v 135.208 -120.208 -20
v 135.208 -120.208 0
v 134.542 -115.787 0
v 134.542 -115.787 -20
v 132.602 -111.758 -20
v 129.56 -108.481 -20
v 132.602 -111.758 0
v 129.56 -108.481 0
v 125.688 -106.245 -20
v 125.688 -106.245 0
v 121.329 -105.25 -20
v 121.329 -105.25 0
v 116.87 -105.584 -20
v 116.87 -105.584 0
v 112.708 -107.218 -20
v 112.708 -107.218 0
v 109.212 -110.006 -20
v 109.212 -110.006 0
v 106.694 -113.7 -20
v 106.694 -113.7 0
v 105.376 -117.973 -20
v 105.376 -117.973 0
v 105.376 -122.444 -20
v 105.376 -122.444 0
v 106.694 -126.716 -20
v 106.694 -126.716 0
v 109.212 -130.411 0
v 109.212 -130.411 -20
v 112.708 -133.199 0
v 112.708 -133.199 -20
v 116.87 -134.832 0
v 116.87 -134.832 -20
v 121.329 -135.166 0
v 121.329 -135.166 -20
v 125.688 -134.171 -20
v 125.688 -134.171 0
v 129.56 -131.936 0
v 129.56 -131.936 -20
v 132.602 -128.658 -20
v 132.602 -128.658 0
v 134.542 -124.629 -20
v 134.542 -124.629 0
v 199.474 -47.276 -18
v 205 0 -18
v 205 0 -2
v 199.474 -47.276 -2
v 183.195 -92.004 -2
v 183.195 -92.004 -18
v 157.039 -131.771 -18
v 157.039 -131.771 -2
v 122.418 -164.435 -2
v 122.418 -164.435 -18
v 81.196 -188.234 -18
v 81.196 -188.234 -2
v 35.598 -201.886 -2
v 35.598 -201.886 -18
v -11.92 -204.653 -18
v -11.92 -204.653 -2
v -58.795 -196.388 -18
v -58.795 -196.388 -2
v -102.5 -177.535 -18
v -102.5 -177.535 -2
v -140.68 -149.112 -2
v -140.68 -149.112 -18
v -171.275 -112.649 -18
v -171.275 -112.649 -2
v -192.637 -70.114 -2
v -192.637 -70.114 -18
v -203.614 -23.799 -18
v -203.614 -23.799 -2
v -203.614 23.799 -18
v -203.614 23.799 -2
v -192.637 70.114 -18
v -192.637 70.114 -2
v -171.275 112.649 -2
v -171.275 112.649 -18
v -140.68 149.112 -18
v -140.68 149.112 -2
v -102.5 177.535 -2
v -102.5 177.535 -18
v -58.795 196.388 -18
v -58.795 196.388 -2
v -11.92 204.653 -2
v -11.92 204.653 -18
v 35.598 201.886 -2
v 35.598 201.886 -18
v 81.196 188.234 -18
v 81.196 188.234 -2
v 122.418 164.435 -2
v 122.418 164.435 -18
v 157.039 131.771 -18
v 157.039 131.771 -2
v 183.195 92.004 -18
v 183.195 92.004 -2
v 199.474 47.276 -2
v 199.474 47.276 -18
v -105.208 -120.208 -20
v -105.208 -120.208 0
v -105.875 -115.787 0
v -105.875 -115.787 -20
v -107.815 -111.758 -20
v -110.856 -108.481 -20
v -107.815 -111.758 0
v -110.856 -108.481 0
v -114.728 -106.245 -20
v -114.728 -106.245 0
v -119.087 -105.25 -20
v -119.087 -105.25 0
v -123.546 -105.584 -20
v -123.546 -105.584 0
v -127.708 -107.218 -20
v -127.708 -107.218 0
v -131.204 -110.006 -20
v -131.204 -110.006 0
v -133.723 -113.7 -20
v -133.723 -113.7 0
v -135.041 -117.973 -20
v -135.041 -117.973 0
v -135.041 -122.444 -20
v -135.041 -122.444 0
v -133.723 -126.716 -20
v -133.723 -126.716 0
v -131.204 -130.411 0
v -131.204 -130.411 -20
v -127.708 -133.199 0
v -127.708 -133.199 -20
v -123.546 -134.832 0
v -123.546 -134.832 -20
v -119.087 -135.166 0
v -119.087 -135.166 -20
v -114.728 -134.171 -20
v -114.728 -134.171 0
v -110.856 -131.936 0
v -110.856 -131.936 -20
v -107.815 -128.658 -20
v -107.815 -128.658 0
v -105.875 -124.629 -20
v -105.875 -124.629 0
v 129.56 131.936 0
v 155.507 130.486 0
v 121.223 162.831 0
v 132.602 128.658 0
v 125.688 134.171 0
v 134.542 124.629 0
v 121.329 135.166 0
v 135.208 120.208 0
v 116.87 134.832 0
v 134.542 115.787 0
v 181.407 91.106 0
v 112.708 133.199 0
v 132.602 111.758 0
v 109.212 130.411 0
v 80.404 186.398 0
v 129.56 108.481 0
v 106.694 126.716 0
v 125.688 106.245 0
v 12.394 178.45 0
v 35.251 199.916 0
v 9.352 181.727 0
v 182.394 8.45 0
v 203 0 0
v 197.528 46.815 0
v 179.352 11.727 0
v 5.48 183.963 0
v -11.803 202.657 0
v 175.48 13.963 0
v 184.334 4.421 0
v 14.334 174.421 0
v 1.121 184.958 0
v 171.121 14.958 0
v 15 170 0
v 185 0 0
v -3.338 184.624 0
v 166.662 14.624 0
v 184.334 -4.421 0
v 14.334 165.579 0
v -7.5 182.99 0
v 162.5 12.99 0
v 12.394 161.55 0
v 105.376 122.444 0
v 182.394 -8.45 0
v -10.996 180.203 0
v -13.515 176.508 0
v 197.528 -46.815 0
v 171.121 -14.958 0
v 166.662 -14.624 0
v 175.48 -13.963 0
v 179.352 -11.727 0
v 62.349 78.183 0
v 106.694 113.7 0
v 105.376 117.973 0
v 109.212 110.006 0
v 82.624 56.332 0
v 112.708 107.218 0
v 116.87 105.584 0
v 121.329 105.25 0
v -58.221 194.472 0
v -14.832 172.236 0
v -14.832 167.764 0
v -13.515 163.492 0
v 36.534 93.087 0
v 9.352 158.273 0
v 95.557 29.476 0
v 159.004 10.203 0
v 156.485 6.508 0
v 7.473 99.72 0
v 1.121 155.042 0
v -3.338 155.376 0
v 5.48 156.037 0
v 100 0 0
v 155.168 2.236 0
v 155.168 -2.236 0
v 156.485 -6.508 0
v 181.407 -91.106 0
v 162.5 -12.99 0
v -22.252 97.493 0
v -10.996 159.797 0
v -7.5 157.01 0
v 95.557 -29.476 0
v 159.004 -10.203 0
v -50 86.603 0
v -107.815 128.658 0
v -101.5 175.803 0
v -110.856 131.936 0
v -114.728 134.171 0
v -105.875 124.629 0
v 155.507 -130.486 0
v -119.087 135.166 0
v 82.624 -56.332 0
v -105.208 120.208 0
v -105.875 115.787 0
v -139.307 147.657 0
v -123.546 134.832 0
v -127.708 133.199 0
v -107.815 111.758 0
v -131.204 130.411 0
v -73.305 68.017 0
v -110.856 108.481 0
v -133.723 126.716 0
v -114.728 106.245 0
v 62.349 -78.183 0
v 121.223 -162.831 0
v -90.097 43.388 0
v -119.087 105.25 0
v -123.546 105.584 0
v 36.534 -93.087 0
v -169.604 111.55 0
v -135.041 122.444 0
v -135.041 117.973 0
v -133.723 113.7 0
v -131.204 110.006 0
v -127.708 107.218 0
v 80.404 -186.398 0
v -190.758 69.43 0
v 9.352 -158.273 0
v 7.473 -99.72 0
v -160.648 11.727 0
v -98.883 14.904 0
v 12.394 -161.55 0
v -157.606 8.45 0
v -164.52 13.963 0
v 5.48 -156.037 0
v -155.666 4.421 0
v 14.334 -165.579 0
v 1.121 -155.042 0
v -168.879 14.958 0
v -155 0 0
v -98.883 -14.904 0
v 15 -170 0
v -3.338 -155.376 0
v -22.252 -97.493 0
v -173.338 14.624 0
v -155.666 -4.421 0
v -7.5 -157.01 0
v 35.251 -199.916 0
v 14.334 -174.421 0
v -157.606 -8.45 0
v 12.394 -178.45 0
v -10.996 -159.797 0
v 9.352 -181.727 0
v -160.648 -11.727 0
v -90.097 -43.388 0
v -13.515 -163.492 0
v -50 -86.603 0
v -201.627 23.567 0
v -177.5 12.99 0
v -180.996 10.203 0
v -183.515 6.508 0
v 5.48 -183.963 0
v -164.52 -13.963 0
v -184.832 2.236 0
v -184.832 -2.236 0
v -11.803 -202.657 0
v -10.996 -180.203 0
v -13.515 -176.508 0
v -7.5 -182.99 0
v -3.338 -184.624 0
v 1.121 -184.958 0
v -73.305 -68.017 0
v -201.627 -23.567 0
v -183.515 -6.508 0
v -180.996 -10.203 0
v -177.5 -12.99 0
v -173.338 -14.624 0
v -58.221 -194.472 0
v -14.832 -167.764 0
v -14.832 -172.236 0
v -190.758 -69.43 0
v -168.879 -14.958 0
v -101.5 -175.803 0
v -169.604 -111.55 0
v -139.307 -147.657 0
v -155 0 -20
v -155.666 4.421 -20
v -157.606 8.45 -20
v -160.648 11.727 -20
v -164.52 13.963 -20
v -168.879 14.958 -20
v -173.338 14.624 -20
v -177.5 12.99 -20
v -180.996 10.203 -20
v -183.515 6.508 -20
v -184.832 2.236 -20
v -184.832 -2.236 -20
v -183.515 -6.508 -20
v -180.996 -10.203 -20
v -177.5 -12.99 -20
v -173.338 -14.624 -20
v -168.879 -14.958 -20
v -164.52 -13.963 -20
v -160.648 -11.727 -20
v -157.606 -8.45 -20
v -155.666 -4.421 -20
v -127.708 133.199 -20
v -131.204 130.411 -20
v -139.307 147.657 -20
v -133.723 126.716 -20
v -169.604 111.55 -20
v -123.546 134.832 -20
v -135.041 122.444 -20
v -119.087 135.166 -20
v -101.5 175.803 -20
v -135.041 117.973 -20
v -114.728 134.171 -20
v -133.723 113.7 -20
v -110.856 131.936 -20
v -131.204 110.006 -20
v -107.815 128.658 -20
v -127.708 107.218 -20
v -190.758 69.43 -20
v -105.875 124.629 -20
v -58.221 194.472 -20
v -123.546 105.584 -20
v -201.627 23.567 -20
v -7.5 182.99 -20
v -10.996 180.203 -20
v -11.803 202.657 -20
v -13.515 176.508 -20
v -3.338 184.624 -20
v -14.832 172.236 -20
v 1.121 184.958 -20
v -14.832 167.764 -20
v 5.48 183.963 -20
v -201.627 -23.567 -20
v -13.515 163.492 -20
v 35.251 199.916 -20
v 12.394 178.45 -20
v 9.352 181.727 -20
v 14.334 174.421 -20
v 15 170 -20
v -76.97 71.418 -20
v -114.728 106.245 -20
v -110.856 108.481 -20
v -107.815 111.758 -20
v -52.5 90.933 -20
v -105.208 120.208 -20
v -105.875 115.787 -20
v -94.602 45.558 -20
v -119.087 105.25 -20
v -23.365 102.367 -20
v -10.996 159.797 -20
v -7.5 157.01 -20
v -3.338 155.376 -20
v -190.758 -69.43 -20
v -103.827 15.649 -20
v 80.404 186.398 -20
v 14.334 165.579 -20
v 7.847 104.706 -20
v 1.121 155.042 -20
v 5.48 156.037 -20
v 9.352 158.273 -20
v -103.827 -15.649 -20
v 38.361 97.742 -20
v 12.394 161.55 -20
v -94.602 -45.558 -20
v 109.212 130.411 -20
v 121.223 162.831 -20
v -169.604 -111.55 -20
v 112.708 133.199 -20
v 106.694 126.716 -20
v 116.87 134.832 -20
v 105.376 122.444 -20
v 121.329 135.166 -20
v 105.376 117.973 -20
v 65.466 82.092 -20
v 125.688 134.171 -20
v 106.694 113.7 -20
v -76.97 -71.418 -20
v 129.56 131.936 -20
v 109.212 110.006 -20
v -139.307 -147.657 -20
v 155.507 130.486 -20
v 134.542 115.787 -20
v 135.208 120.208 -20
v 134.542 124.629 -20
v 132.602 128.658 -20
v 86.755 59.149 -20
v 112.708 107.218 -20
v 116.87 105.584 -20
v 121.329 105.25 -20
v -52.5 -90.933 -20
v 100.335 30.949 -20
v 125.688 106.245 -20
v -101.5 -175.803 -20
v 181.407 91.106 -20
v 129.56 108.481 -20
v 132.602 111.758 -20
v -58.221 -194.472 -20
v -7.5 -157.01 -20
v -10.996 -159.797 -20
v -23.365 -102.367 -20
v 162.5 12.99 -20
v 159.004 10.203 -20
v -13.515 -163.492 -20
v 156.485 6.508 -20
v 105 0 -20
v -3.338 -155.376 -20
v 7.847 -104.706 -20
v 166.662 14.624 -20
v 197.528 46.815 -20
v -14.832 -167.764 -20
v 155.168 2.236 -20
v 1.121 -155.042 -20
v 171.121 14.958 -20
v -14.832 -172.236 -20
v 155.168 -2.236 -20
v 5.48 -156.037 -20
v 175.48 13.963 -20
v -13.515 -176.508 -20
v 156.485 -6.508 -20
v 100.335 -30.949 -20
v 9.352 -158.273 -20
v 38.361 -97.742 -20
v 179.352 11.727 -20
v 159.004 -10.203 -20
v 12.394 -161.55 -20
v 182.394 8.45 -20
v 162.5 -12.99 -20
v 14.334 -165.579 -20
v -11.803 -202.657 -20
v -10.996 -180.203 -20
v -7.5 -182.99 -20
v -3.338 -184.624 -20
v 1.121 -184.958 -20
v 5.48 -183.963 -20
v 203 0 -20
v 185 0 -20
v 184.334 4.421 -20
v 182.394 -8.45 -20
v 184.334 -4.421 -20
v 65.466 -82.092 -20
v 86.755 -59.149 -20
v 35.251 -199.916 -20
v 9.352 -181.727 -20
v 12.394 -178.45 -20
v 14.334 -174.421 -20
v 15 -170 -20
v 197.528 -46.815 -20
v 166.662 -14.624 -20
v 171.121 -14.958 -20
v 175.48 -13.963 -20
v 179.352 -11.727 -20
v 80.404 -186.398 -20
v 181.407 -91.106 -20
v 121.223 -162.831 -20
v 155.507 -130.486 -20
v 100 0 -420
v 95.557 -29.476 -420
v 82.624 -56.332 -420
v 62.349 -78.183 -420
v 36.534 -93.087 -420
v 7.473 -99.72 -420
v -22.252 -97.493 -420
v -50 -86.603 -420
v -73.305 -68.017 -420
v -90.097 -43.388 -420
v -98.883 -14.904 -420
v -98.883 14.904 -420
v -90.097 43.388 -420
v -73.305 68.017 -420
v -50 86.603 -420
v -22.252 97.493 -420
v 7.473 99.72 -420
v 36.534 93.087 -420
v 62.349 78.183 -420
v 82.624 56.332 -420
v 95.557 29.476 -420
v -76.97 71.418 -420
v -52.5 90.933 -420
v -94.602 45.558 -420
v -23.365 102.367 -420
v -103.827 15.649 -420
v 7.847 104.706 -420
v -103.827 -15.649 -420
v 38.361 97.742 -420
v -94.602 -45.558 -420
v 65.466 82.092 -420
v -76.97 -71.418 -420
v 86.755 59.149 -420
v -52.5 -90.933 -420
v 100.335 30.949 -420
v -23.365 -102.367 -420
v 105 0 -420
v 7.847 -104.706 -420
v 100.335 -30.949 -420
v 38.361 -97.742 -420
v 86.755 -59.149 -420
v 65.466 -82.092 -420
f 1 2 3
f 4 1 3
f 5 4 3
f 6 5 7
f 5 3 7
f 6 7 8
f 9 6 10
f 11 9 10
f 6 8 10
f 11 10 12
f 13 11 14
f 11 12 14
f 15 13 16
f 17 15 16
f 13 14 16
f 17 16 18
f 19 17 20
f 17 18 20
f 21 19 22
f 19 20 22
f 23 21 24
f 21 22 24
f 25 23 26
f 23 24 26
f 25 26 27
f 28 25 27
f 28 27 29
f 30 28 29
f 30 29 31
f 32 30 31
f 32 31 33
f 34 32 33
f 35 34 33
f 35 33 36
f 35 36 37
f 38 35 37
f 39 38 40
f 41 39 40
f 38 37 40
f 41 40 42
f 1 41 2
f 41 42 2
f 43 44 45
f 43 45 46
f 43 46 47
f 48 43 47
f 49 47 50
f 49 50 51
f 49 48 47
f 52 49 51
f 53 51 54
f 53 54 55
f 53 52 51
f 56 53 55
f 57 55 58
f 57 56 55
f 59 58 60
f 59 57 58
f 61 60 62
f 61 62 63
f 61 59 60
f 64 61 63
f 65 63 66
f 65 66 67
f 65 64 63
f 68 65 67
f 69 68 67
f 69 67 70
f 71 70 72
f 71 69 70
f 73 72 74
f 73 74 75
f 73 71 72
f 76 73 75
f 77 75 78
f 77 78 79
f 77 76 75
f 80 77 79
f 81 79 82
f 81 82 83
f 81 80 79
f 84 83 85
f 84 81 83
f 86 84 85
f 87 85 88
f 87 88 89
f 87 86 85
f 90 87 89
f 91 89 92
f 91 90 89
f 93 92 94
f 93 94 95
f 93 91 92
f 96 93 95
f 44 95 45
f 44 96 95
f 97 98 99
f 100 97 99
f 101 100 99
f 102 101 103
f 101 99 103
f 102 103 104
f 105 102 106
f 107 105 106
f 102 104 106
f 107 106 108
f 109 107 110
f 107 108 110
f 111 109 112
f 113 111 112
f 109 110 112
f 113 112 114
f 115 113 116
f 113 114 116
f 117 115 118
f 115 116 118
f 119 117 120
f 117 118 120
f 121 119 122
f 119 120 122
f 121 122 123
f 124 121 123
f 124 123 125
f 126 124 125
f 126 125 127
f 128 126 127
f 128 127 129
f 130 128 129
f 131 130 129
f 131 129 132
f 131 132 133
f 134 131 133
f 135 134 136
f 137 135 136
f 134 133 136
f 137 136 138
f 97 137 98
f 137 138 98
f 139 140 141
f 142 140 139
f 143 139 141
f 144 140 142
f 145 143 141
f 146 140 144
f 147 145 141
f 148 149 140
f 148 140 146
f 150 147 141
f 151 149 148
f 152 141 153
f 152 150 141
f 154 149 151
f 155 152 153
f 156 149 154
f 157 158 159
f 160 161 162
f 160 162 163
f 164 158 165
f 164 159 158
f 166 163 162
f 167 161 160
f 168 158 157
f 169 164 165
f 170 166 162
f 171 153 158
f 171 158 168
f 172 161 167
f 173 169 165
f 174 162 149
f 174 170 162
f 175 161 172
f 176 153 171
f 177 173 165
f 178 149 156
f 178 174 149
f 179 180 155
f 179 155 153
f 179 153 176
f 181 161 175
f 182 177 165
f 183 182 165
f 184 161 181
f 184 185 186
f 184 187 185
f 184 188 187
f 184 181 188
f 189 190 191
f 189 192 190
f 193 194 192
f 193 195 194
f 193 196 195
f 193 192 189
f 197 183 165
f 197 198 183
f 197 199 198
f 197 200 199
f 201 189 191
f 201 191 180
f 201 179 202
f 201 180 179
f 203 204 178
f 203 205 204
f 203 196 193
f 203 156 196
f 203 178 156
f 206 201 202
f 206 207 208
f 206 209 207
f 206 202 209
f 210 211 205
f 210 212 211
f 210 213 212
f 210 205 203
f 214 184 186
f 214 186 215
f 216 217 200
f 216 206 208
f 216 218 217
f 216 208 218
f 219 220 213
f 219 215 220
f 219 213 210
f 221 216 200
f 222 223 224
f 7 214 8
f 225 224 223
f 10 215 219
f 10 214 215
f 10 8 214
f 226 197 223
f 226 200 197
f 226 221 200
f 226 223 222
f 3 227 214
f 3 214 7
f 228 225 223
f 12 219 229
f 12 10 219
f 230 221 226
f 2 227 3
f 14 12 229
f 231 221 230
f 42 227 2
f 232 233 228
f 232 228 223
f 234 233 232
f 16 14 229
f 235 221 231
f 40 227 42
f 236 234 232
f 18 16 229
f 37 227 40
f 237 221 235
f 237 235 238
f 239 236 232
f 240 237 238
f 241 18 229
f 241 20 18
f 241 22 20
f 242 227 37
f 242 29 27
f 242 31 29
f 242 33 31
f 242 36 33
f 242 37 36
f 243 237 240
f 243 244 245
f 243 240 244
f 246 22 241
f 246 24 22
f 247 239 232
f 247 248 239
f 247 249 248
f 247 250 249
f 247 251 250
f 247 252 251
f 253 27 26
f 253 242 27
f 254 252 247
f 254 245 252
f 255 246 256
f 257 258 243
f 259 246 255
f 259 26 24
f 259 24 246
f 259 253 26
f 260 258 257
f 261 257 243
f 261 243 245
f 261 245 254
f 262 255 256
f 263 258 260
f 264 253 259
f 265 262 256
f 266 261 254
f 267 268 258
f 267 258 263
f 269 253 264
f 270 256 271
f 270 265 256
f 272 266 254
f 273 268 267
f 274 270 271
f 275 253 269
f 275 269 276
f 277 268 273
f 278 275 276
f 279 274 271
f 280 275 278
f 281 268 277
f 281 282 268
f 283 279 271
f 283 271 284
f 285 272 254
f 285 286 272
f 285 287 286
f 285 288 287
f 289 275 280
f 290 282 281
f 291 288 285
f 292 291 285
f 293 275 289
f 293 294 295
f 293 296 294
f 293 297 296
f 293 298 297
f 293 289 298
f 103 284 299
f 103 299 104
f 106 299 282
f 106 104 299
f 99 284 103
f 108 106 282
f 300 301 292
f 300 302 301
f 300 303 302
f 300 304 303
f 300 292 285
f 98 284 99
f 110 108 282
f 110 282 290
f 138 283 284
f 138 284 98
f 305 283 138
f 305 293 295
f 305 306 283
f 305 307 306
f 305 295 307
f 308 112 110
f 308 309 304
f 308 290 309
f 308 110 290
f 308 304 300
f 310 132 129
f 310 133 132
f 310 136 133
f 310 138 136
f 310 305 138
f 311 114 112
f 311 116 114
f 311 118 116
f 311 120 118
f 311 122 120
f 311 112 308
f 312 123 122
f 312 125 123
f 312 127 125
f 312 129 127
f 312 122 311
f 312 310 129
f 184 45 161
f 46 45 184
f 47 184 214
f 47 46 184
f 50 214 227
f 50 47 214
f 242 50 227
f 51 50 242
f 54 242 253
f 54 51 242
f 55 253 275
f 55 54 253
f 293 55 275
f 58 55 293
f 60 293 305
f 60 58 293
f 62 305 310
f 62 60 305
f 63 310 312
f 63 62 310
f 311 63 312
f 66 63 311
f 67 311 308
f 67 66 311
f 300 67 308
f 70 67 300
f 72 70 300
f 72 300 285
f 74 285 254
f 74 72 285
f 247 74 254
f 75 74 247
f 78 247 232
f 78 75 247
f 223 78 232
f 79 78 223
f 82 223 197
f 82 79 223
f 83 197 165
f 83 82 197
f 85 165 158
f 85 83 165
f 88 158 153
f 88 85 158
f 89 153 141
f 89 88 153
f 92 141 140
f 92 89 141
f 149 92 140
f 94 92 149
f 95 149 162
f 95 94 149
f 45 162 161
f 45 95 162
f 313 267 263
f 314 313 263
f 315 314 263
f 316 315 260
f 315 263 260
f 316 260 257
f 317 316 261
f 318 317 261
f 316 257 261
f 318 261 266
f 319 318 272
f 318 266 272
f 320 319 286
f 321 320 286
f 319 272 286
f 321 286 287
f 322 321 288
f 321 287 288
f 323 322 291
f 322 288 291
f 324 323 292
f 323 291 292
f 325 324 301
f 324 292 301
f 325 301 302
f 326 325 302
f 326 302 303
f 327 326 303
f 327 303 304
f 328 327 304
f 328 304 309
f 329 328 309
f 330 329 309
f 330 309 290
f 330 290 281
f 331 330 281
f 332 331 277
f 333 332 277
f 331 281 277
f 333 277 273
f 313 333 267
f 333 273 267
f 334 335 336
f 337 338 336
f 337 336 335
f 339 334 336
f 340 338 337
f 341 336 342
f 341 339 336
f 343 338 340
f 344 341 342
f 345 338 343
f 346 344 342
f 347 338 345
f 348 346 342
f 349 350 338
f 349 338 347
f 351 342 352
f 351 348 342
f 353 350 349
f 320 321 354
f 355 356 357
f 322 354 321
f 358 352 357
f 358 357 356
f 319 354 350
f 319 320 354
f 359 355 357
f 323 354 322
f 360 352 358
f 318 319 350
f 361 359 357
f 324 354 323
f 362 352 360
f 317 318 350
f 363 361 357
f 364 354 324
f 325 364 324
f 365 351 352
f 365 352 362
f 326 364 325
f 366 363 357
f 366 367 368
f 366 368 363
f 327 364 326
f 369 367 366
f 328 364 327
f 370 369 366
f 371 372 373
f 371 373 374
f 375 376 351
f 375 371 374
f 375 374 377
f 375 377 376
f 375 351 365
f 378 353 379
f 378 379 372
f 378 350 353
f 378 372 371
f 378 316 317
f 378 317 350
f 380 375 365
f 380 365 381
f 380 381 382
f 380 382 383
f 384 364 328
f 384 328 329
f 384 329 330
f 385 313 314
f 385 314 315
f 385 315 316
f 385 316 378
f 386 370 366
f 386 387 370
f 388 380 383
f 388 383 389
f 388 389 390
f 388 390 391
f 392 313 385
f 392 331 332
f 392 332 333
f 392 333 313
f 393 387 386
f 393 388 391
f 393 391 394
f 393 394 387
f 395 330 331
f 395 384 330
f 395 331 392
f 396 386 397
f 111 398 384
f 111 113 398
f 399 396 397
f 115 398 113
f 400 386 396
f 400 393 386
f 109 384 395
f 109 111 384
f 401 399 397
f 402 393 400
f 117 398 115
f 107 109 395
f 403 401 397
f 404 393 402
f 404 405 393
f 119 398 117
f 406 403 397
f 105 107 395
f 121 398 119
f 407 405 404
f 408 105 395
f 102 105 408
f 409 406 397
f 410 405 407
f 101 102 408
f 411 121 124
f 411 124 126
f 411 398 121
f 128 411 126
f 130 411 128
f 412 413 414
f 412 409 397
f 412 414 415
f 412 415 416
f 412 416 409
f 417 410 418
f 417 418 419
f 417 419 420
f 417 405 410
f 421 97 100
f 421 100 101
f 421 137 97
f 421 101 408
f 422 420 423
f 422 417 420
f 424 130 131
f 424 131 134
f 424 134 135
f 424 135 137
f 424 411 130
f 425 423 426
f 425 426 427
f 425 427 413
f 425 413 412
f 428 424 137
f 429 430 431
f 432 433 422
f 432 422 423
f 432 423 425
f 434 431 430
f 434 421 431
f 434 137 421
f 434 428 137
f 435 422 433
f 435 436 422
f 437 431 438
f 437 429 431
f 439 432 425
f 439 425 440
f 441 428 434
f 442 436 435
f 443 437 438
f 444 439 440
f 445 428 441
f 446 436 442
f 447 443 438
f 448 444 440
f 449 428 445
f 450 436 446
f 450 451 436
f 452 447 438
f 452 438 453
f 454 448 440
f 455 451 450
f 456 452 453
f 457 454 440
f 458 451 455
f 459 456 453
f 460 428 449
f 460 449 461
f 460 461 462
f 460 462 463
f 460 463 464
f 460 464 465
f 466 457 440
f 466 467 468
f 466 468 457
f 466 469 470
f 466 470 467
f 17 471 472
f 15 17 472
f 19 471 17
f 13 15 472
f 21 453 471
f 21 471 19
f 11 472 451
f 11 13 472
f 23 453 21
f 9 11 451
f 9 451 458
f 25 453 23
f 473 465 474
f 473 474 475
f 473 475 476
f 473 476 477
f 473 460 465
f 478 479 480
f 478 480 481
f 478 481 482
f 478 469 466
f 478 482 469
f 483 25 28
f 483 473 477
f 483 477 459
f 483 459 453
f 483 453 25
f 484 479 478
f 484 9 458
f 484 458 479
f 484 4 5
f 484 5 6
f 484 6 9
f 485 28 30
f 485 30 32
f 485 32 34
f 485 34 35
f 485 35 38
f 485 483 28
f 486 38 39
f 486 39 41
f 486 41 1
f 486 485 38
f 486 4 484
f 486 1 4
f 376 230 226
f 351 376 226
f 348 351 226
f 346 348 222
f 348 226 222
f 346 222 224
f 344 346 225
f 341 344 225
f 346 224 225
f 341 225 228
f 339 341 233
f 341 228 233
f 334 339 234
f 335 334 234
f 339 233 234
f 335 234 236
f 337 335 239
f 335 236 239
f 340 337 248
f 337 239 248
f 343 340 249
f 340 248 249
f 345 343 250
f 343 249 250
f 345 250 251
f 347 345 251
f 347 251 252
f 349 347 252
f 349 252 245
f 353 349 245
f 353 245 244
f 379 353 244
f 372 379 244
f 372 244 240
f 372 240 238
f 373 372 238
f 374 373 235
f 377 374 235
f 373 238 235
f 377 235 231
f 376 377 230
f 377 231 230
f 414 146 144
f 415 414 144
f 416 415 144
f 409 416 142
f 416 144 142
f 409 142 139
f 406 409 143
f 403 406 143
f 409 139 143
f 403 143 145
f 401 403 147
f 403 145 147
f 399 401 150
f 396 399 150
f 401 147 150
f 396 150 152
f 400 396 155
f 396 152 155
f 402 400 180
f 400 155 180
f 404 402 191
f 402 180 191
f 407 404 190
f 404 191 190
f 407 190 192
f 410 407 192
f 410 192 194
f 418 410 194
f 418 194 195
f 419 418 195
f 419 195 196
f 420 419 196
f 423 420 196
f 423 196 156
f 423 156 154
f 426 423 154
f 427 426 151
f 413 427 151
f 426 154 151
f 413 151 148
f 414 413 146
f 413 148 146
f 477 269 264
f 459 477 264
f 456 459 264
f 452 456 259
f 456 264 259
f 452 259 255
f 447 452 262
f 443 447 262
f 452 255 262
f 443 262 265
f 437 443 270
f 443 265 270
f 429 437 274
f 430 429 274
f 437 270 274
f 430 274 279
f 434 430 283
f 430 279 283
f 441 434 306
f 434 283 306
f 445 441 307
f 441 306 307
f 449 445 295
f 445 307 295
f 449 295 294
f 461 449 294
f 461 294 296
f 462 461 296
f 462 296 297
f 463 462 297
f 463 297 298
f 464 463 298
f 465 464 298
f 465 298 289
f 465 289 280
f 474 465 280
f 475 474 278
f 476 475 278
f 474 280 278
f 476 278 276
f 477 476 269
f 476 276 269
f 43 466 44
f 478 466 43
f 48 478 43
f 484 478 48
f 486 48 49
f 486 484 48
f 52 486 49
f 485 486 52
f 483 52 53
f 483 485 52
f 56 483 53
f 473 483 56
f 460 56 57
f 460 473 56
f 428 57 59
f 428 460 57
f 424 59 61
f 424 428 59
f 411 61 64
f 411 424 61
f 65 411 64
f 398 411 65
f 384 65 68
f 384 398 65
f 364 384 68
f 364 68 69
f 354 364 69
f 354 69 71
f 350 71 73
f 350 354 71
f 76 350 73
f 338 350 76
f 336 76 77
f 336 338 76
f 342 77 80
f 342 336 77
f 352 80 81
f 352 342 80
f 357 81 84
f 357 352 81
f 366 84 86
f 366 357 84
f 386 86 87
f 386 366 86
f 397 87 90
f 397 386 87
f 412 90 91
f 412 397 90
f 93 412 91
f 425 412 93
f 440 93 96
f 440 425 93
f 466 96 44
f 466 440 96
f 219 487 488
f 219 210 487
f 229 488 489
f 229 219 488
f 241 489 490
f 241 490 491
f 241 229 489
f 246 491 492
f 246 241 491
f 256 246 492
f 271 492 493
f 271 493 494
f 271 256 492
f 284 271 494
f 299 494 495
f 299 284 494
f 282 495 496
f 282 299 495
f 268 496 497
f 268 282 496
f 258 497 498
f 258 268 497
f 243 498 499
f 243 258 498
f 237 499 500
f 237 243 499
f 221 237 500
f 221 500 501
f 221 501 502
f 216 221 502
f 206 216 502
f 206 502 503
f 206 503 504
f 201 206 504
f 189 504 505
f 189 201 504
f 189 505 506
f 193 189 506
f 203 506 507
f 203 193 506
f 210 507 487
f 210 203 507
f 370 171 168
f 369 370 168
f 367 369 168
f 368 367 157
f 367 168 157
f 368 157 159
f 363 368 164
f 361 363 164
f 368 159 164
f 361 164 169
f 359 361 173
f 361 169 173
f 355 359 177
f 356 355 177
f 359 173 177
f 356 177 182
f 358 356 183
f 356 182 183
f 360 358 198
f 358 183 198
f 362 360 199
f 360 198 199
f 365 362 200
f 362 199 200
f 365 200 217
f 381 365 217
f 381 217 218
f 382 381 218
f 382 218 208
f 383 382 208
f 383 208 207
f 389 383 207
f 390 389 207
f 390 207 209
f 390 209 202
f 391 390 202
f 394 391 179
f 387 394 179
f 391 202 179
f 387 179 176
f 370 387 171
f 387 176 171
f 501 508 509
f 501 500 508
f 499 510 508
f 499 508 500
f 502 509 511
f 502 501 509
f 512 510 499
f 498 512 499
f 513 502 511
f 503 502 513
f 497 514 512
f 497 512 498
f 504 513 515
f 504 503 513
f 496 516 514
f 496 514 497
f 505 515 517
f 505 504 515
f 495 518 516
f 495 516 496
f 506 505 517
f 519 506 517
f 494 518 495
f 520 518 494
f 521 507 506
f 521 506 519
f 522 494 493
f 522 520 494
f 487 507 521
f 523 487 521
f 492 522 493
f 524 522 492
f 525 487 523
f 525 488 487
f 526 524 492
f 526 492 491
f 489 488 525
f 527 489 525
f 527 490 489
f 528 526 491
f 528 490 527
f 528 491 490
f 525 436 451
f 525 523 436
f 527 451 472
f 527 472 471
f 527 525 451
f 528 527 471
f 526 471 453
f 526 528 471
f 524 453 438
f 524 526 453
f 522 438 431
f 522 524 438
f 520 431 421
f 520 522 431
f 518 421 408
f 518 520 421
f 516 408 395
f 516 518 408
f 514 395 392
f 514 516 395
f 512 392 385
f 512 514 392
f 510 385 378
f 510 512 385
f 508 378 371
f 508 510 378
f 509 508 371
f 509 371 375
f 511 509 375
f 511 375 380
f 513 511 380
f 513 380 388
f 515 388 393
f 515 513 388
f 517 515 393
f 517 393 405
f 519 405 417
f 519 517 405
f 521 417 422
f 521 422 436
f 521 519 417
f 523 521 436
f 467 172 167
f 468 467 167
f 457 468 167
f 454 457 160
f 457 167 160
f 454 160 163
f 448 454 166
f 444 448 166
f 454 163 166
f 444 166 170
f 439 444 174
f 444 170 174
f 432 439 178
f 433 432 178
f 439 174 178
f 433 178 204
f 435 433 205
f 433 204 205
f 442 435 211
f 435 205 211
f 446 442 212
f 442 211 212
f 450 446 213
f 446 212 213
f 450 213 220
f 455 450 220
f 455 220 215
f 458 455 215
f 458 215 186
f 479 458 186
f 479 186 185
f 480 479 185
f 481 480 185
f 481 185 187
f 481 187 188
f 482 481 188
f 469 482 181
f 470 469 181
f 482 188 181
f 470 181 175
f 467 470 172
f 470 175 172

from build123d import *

# Parameters (mm, degrees)
SKETCH2_R          = 15
CUT_EXTRUDE1_DEPTH = 20
CHAMFER1_SIZE      = 2


with BuildPart() as part:
    # Sketch1 → Revolve1 (revolve)
    with BuildSketch(Plane(origin=(0, 0, 0), x_dir=(0, 0, -1), z_dir=(1, 0, 0)), mode=Mode.PRIVATE) as revolve1_sk:
        Polygon((0, 100), (0, 205), (20, 205), (20, 105), (420, 105), (420, 100), align=None)
    revolve(revolve1_sk.sketch.rotate(Axis((0, 0, 0), (0, 0, -1)), 90), axis=Axis((0, 0, 0), (0, 0, -1)))

    # Sketch2 → Cut-Extrude1 (cut)
    with BuildSketch(Plane.XY):
        with Locations((0, 170)):
            Circle(SKETCH2_R)
        with Locations((120.208152802, 120.208152802)):
            Circle(SKETCH2_R)
        with Locations((170, 0)):
            Circle(SKETCH2_R)
        with Locations((120.208152802, -120.208152802)):
            Circle(SKETCH2_R)
        with Locations((0, -170)):
            Circle(SKETCH2_R)
        with Locations((-120.208152802, -120.208152802)):
            Circle(SKETCH2_R)
        with Locations((-170, 0)):
            Circle(SKETCH2_R)
        with Locations((-120.208152802, 120.208152802)):
            Circle(SKETCH2_R)
    extrude(amount=-CUT_EXTRUDE1_DEPTH, mode=Mode.SUBTRACT)

    # Chamfer1
    chamfer1_edges = [part.edges().sort_by_distance(p)[0] for p in [
        (-205, 0, -20),
        (-205, 0, 0),
    ]]
    chamfer(chamfer1_edges, length=CHAMFER1_SIZE)


solid = part.part
